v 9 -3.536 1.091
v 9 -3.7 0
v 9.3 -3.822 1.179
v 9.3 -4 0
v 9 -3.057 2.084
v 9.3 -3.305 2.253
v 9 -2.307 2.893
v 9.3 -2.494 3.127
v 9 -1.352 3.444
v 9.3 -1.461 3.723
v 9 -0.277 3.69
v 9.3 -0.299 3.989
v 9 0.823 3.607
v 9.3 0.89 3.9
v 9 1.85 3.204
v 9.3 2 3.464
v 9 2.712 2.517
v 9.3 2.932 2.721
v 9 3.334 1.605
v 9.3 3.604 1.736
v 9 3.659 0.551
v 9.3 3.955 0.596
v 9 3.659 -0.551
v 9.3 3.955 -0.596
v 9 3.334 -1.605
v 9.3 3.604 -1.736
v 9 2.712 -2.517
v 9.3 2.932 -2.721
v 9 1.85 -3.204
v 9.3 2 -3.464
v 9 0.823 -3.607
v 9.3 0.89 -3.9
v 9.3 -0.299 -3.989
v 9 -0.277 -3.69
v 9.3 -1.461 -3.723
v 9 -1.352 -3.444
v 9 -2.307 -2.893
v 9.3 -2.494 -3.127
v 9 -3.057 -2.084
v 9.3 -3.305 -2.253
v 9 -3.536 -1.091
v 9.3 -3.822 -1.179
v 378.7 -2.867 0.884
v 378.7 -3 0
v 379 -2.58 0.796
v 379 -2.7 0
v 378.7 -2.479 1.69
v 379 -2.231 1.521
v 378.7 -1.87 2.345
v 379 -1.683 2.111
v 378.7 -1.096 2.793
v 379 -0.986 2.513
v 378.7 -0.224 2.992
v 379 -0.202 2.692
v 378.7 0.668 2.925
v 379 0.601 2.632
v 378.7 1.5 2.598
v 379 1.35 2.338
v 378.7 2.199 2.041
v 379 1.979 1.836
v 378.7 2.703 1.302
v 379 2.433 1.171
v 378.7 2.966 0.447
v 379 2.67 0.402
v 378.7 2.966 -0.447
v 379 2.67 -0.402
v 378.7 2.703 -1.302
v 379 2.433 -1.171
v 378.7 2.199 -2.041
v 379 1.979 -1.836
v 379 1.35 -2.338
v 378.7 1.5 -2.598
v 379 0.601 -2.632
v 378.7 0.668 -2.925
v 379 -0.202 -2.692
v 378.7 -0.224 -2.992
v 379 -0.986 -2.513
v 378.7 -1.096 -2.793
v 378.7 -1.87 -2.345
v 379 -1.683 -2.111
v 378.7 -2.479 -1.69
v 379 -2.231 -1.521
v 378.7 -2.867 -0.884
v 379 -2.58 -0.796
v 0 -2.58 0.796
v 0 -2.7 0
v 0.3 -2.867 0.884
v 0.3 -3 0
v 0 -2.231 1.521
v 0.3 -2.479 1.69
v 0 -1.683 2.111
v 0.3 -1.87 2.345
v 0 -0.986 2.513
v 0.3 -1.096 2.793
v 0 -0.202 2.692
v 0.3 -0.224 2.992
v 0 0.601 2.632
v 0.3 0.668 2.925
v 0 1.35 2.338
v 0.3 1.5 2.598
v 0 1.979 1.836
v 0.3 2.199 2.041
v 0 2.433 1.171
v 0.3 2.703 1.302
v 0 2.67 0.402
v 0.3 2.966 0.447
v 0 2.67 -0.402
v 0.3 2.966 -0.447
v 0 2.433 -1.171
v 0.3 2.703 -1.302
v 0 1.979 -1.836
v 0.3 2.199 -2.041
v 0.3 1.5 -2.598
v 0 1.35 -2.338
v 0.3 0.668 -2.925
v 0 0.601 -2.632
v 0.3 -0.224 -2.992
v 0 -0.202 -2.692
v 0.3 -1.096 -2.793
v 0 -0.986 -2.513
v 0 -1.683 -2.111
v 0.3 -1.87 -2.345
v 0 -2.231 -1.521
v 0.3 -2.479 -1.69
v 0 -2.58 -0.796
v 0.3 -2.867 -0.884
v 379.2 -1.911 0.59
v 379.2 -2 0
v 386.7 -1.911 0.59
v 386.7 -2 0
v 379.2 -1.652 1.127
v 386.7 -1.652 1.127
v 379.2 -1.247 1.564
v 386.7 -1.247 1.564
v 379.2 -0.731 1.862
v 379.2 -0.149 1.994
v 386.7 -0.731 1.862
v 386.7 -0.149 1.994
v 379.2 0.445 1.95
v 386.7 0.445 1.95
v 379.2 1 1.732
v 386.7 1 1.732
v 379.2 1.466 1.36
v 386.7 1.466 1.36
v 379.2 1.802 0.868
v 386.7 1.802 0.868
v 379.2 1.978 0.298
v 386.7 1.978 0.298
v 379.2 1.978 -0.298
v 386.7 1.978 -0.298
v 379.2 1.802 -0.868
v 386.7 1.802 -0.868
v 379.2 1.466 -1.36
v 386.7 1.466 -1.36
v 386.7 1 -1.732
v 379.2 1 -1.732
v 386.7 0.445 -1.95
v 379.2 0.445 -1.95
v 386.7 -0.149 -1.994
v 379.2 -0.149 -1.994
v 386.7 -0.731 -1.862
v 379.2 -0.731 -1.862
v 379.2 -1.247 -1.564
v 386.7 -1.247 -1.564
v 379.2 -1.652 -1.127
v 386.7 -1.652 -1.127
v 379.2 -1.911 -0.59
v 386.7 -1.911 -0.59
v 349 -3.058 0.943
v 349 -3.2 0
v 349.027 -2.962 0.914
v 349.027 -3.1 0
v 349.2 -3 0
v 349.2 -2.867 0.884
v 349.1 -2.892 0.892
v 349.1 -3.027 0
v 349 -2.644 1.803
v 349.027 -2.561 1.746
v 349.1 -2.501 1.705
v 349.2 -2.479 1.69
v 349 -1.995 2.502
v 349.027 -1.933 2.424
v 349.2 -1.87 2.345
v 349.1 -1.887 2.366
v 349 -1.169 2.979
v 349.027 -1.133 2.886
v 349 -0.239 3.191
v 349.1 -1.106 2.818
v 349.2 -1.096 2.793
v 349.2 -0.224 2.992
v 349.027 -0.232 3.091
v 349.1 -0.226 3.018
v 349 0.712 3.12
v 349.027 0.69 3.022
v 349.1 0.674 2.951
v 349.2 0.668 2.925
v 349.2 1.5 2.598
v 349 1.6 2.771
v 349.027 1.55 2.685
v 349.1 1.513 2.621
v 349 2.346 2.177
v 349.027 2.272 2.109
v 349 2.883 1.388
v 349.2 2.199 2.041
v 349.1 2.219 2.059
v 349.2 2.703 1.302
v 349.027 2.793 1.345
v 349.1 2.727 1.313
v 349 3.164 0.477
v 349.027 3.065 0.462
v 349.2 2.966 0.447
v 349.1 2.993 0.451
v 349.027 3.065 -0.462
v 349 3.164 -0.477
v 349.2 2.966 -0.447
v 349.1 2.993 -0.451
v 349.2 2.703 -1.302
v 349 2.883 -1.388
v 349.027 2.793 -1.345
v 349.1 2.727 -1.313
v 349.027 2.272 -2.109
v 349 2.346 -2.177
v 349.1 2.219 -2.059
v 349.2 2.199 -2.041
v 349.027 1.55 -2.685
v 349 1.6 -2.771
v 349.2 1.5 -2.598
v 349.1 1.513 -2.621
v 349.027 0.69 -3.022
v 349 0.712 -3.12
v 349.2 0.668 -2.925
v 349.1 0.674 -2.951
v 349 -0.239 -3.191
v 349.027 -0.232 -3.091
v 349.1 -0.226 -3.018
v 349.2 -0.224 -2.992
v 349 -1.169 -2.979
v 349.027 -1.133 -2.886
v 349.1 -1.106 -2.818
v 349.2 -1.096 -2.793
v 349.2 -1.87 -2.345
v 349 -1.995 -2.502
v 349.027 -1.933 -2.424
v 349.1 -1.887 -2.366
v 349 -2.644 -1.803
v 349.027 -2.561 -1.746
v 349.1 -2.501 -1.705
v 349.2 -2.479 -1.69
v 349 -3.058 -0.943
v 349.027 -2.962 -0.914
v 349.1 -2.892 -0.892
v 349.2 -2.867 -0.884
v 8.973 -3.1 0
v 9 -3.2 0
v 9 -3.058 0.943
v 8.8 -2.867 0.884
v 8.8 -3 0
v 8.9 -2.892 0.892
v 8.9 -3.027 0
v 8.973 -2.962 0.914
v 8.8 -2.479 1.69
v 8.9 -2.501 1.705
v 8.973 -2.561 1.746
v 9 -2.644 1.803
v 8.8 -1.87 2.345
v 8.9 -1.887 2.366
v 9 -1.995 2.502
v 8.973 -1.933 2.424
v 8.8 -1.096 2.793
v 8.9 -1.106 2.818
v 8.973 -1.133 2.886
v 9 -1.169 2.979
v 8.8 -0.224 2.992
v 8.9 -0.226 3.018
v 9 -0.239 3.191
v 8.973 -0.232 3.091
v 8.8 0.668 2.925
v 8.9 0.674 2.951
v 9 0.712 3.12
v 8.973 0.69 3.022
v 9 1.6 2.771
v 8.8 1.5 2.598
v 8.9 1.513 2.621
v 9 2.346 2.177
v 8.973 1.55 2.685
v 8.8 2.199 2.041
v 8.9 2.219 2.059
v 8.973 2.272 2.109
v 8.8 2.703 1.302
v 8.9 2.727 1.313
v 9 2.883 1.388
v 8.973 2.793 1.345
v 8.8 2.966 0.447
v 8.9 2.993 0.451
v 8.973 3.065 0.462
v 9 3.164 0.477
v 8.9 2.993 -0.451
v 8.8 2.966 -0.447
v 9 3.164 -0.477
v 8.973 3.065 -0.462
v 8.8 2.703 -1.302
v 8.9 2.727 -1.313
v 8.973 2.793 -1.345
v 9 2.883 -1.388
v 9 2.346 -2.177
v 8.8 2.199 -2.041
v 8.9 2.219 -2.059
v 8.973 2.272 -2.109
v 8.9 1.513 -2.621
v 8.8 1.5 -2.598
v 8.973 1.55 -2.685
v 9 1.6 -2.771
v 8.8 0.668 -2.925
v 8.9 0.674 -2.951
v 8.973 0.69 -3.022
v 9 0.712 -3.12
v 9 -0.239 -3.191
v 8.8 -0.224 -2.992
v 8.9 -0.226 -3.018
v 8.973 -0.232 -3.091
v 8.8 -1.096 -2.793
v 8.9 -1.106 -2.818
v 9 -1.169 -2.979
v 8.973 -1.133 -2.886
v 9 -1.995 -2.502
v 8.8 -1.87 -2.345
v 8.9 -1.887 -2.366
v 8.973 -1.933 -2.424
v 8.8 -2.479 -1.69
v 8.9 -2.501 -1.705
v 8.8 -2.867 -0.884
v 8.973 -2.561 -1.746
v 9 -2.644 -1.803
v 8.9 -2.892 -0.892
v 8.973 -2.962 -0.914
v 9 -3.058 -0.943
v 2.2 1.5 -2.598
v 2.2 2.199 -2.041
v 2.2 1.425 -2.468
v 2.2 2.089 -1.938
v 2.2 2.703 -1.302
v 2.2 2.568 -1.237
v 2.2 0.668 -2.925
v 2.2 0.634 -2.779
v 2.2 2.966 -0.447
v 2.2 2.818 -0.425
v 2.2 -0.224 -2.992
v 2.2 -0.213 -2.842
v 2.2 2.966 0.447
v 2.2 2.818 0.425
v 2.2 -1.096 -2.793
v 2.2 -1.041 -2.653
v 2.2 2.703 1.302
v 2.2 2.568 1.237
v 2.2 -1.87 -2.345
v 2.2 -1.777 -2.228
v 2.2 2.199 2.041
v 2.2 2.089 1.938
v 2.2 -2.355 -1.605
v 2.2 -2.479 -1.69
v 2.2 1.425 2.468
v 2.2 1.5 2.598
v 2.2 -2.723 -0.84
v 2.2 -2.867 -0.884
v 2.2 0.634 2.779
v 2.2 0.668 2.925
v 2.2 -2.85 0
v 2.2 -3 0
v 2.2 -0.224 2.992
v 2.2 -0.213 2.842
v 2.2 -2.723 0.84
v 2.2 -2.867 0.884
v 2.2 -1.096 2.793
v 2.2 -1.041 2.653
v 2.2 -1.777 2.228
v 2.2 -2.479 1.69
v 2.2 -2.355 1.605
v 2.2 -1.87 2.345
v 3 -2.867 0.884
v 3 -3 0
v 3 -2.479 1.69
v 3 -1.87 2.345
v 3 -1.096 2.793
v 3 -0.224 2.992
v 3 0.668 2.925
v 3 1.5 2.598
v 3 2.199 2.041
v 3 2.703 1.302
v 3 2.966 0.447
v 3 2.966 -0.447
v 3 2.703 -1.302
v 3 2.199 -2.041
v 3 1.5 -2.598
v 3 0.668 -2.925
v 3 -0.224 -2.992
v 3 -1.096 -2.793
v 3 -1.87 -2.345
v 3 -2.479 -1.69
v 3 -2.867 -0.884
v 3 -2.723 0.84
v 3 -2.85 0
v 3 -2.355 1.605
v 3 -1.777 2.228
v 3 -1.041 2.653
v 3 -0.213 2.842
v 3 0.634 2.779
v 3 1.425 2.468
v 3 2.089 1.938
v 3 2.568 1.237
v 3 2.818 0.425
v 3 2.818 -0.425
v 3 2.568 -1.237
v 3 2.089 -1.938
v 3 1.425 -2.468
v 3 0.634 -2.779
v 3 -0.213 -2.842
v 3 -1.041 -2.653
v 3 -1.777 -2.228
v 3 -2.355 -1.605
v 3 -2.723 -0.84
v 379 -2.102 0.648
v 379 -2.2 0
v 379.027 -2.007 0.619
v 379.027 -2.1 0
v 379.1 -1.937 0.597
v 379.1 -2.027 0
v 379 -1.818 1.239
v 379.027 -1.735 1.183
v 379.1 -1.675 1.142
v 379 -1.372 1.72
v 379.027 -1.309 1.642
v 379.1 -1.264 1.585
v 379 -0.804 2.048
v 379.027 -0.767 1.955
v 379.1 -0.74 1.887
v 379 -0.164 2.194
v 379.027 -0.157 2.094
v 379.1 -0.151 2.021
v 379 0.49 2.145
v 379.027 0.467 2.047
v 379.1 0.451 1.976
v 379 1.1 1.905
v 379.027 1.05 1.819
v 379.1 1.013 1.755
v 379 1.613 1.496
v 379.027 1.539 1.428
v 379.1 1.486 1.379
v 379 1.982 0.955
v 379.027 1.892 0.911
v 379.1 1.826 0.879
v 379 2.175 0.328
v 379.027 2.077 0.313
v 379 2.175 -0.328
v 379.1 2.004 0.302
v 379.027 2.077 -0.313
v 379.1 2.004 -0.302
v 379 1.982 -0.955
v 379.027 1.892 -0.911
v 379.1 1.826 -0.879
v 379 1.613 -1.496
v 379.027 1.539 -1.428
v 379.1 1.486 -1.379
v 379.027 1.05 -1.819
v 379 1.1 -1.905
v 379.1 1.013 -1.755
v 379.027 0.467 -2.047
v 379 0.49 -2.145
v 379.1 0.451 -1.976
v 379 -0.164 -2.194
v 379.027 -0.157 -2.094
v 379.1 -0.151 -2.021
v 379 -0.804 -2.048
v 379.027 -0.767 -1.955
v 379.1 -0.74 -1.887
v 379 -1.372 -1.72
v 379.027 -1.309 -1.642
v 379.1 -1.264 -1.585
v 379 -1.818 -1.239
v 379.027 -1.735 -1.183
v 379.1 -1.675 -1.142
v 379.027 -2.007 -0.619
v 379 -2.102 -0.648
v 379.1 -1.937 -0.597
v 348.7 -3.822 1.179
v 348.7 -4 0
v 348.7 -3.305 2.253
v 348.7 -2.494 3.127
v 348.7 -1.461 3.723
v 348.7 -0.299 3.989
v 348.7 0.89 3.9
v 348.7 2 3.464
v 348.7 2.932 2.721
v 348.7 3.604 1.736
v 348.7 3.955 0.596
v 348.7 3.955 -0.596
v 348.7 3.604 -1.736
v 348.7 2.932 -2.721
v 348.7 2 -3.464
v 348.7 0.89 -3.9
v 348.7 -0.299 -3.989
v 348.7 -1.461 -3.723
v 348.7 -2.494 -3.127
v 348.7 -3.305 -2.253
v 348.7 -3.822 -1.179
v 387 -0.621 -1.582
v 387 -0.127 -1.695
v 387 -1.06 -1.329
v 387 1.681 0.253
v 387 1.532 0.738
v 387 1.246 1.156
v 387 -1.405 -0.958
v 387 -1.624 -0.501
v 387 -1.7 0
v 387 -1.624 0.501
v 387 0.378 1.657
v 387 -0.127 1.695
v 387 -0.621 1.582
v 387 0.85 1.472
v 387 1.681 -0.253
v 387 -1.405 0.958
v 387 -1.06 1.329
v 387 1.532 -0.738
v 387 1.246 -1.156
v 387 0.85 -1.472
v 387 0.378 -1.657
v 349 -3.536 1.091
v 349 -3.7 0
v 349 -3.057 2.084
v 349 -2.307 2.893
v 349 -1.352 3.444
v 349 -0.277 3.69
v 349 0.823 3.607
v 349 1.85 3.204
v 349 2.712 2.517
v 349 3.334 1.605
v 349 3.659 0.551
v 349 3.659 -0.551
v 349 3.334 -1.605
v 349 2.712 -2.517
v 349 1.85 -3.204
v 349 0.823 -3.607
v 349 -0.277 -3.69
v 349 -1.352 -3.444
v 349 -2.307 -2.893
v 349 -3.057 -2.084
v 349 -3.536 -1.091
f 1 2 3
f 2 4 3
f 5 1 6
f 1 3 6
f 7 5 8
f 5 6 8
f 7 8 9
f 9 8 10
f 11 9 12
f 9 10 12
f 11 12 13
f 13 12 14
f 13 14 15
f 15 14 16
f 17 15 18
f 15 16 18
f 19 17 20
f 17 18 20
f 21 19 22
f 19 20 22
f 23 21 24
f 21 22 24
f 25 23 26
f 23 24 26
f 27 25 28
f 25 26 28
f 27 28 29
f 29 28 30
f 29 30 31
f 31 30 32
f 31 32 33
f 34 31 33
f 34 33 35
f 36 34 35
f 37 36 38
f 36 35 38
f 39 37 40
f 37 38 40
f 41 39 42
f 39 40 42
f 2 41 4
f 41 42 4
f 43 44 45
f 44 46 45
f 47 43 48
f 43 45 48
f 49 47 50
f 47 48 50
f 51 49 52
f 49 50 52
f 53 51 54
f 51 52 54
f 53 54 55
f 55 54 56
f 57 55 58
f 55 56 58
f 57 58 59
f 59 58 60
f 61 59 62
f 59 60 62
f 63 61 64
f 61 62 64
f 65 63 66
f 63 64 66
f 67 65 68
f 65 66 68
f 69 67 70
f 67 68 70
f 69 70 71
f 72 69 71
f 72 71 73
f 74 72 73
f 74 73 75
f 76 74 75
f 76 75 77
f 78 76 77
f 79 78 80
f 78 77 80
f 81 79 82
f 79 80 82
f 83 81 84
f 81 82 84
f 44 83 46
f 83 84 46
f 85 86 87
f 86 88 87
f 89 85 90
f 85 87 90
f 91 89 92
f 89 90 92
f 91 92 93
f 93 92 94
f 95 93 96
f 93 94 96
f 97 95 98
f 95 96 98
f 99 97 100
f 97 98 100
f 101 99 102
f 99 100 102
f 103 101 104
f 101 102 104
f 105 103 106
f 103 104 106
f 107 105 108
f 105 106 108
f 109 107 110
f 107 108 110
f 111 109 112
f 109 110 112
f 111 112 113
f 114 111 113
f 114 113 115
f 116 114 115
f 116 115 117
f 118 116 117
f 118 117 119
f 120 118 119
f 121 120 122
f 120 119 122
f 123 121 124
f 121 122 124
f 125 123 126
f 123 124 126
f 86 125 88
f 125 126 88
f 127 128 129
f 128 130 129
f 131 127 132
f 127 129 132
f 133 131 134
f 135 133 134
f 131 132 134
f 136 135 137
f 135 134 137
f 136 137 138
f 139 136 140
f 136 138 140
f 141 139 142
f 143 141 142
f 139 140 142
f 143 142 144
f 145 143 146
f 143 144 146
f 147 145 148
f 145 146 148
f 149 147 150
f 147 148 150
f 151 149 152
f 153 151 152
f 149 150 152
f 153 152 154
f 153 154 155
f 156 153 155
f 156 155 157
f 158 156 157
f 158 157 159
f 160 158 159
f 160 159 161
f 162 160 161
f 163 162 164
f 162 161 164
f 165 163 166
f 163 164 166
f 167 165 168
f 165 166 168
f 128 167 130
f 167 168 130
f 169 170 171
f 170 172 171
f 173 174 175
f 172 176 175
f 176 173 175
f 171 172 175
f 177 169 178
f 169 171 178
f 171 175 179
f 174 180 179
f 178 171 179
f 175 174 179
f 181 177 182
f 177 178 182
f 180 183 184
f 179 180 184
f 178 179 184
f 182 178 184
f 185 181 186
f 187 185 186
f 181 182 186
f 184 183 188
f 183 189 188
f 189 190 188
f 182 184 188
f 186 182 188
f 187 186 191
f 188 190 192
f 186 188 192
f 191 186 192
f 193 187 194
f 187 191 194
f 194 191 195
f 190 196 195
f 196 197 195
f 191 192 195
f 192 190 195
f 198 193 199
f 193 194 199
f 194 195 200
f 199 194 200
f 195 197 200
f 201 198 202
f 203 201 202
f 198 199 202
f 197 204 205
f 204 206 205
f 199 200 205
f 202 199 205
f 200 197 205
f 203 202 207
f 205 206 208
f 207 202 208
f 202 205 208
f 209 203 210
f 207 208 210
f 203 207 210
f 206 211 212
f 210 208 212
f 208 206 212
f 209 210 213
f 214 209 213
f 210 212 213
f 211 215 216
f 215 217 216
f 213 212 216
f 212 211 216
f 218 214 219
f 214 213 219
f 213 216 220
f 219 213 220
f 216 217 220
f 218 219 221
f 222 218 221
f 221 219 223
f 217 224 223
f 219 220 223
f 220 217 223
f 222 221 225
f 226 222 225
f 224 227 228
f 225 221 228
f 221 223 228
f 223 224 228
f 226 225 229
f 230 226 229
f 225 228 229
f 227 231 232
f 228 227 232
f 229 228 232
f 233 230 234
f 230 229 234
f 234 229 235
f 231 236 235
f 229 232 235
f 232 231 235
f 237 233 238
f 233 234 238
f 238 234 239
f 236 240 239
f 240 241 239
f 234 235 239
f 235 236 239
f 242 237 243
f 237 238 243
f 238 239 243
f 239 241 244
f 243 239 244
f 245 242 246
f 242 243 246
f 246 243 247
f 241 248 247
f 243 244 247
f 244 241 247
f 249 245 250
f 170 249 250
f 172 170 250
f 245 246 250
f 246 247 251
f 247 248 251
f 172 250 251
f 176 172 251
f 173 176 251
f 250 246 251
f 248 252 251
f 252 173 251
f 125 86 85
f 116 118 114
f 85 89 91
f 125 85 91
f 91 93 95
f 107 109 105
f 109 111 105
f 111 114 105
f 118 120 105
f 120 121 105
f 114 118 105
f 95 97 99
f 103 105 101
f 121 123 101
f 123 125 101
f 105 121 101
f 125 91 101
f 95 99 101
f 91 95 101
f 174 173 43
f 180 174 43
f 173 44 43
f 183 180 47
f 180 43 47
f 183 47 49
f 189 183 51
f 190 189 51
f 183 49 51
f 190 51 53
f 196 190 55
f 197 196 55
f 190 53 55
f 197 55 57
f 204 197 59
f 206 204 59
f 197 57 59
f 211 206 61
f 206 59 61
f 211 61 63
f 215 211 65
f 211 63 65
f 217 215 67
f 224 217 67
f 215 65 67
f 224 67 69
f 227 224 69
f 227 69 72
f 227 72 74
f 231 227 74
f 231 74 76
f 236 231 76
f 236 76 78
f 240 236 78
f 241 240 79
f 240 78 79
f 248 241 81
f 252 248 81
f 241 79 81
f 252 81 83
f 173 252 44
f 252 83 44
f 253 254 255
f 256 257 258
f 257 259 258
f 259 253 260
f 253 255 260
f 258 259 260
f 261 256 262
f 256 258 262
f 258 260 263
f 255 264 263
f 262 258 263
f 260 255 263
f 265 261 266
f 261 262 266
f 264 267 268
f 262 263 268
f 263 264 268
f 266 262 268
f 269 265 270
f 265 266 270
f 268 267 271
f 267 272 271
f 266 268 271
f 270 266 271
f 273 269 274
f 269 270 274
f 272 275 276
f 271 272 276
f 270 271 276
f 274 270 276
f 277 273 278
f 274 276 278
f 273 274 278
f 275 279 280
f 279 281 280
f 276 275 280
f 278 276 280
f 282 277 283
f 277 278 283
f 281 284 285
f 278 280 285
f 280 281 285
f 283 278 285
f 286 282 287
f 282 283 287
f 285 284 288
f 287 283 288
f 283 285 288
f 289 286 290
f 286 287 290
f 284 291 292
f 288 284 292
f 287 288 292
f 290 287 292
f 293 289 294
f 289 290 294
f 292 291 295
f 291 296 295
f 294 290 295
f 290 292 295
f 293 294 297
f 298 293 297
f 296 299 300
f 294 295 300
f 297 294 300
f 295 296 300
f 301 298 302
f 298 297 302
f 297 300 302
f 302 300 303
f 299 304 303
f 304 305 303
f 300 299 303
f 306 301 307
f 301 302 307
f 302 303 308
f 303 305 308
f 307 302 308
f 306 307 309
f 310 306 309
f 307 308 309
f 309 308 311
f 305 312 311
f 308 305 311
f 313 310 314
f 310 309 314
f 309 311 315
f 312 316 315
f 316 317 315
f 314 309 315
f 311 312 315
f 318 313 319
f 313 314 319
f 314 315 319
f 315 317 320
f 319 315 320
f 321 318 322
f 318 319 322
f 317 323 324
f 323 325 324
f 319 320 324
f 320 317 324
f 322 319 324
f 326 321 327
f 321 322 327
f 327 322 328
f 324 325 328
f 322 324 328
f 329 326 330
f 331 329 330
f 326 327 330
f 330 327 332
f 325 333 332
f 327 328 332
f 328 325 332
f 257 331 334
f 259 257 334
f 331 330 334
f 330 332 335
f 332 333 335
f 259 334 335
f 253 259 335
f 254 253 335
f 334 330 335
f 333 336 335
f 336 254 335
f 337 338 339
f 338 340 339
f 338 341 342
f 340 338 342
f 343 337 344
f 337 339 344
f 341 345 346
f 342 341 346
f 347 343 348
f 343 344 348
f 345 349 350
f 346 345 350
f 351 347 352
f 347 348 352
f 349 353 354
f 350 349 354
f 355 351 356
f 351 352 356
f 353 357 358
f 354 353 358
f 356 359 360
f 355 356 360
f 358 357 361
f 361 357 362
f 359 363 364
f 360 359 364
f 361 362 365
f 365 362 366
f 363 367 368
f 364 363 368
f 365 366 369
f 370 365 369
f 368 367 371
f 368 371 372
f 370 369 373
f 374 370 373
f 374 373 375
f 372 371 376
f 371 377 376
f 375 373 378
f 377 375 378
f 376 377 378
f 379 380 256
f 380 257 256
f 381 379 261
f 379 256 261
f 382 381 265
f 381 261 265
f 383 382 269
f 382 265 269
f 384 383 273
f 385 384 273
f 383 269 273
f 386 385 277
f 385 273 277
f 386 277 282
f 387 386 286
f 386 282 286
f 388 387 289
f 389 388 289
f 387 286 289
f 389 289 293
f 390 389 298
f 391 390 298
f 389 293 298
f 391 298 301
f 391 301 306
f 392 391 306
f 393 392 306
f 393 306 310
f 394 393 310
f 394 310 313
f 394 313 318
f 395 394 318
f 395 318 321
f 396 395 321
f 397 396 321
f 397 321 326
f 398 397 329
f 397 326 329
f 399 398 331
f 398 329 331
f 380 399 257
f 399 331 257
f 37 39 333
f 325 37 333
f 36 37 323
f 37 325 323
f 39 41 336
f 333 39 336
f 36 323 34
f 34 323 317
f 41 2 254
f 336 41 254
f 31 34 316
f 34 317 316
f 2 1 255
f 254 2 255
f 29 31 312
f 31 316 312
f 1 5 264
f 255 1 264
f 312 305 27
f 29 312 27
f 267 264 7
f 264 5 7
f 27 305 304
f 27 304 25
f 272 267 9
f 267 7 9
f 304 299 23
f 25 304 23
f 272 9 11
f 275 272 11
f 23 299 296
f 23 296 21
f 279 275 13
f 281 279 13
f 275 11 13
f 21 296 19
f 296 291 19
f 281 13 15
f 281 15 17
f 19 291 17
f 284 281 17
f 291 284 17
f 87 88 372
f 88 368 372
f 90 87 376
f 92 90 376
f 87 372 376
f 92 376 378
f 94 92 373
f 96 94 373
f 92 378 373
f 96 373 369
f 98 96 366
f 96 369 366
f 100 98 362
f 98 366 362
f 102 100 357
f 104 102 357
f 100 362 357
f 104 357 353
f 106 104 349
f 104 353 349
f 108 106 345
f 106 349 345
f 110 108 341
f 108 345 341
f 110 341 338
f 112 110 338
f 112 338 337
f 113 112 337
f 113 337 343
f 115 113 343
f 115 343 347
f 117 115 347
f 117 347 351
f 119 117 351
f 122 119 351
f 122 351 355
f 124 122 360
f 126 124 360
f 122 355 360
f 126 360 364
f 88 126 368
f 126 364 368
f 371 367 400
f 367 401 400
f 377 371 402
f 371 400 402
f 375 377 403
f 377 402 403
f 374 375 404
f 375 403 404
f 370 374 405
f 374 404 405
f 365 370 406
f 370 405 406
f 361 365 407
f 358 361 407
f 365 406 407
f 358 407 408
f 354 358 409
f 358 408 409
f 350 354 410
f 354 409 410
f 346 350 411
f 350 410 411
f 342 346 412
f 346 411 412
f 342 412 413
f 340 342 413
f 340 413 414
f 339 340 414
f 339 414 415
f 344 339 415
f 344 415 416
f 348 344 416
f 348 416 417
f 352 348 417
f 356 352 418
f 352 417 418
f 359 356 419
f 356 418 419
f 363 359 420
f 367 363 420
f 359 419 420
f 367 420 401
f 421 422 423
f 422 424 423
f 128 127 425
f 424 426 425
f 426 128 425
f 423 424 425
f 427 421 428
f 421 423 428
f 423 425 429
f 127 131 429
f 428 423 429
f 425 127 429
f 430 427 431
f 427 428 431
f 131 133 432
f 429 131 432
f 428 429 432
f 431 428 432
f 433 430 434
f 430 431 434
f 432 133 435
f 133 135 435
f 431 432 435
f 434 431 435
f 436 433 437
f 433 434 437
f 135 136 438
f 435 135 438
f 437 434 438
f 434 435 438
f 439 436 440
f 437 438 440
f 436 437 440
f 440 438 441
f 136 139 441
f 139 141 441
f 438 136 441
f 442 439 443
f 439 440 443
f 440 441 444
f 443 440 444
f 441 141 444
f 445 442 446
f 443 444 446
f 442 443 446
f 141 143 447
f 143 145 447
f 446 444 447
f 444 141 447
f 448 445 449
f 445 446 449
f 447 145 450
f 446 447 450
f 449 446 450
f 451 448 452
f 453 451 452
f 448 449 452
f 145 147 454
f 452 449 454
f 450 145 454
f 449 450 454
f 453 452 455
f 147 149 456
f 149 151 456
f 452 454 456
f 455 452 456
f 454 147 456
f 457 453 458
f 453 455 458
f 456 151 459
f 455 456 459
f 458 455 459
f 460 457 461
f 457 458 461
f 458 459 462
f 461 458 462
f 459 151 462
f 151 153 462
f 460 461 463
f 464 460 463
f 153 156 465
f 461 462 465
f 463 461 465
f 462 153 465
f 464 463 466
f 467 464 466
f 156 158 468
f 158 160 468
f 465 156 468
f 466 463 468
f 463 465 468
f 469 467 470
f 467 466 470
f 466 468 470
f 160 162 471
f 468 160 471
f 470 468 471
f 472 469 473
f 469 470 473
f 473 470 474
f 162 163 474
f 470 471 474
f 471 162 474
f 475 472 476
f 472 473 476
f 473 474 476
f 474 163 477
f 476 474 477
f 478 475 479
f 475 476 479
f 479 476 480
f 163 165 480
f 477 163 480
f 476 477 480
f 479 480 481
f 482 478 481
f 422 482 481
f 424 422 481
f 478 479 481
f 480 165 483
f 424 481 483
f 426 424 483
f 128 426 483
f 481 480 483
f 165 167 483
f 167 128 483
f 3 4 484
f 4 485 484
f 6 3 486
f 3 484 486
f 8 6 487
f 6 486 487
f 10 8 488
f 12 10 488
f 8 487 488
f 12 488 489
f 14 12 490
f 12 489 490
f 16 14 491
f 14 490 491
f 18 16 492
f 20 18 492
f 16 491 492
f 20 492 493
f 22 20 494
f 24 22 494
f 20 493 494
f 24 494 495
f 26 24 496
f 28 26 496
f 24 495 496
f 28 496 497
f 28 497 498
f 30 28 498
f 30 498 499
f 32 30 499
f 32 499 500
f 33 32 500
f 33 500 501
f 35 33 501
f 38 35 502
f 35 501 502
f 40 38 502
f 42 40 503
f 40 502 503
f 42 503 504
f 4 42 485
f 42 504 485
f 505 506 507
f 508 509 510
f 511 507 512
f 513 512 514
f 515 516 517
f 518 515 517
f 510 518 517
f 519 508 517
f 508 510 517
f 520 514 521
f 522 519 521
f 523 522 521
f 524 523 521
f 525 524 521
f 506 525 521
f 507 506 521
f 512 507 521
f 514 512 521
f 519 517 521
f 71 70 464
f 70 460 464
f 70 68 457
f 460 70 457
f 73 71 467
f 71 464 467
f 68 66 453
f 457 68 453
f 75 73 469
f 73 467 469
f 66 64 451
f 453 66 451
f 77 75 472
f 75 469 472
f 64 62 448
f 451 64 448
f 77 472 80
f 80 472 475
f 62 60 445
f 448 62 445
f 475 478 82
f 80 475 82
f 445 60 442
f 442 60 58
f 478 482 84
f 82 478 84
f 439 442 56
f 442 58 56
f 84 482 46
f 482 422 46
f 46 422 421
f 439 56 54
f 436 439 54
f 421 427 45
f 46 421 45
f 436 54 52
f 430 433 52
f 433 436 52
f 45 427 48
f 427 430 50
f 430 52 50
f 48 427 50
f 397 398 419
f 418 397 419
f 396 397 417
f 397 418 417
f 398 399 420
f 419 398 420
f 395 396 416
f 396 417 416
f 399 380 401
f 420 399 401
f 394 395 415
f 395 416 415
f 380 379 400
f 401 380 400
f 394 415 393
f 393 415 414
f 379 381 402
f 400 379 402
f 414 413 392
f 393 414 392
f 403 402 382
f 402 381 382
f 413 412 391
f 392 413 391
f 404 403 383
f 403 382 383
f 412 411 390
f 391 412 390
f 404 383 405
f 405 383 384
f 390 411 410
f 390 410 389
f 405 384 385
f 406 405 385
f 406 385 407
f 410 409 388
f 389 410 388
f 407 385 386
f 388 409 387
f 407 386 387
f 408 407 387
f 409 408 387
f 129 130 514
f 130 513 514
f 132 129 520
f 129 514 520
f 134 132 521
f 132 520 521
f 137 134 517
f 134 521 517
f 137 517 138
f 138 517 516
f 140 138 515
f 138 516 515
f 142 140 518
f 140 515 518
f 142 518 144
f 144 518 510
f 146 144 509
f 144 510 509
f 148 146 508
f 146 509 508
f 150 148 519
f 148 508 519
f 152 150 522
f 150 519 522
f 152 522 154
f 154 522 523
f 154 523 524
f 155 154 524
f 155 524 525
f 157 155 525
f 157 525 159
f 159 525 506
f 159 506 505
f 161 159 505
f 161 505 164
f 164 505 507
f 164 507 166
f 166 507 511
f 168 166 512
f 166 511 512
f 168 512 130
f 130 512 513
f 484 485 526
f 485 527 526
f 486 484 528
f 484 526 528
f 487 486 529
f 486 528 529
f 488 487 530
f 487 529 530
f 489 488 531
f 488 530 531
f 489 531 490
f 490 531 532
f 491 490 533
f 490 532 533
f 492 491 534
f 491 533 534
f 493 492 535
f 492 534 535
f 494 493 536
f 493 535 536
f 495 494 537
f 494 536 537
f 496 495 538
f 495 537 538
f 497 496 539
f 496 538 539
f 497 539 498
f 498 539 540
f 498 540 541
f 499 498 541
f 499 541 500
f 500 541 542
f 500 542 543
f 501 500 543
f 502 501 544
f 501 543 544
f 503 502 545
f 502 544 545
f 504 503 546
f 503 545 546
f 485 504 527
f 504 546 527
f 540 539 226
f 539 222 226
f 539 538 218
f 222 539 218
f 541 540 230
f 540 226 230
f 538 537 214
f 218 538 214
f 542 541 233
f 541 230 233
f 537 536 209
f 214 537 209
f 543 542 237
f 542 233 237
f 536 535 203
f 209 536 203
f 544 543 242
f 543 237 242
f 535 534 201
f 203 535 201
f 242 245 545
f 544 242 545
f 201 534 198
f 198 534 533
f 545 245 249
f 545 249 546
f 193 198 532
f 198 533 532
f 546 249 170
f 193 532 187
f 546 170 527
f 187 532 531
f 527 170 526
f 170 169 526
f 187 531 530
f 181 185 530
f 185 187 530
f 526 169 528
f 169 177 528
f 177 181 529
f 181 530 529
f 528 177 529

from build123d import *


with BuildPart() as part:
    # 草图1 → 旋转1 (revolve)
    with BuildSketch(Plane(origin=(0, 0, 0), x_dir=(-1, 0, 0), z_dir=(0, 0, -1)), mode=Mode.PRIVATE) as revolve_1_sk:
        with BuildLine():
            Line((-387, 1.7), (-387, 0))
            Line((-387, 0), (0, 0))
            Line((0, 0), (0, 2.7))
            Line((0, 2.7), (-0.3, 3))
            Line((-0.3, 3), (-2.2, 3))
            Line((-2.2, 3), (-2.2, 2.85))
            Line((-2.2, 2.85), (-3, 2.85))
            Line((-3, 2.85), (-3, 3))
            Line((-3, 3), (-8.8, 3))
            ThreePointArc((-8.8, 3), (-8.941421356, 3.058578644), (-9, 3.2))
            Line((-9, 3.2), (-9, 3.7))
            Line((-9, 3.7), (-9.3, 4))
            Line((-9.3, 4), (-348.7, 4))
            Line((-348.7, 4), (-349, 3.7))
            Line((-349, 3.7), (-349, 3.2))
            ThreePointArc((-349, 3.2), (-349.058578644, 3.058578644), (-349.2, 3))
            Line((-349.2, 3), (-378.7, 3))
            Line((-378.7, 3), (-379, 2.7))
            Line((-379, 2.7), (-379, 2.2))
            ThreePointArc((-379, 2.2), (-379.058578644, 2.058578644), (-379.2, 2))
            Line((-379.2, 2), (-386.7, 2))
            Line((-386.7, 2), (-387, 1.7))
        make_face()
    revolve(revolve_1_sk.sketch.rotate(Axis((387, 0, 0), (-1, 0, 0)), 180), axis=Axis((387, 0, 0), (-1, 0, 0)))


solid = part.part
